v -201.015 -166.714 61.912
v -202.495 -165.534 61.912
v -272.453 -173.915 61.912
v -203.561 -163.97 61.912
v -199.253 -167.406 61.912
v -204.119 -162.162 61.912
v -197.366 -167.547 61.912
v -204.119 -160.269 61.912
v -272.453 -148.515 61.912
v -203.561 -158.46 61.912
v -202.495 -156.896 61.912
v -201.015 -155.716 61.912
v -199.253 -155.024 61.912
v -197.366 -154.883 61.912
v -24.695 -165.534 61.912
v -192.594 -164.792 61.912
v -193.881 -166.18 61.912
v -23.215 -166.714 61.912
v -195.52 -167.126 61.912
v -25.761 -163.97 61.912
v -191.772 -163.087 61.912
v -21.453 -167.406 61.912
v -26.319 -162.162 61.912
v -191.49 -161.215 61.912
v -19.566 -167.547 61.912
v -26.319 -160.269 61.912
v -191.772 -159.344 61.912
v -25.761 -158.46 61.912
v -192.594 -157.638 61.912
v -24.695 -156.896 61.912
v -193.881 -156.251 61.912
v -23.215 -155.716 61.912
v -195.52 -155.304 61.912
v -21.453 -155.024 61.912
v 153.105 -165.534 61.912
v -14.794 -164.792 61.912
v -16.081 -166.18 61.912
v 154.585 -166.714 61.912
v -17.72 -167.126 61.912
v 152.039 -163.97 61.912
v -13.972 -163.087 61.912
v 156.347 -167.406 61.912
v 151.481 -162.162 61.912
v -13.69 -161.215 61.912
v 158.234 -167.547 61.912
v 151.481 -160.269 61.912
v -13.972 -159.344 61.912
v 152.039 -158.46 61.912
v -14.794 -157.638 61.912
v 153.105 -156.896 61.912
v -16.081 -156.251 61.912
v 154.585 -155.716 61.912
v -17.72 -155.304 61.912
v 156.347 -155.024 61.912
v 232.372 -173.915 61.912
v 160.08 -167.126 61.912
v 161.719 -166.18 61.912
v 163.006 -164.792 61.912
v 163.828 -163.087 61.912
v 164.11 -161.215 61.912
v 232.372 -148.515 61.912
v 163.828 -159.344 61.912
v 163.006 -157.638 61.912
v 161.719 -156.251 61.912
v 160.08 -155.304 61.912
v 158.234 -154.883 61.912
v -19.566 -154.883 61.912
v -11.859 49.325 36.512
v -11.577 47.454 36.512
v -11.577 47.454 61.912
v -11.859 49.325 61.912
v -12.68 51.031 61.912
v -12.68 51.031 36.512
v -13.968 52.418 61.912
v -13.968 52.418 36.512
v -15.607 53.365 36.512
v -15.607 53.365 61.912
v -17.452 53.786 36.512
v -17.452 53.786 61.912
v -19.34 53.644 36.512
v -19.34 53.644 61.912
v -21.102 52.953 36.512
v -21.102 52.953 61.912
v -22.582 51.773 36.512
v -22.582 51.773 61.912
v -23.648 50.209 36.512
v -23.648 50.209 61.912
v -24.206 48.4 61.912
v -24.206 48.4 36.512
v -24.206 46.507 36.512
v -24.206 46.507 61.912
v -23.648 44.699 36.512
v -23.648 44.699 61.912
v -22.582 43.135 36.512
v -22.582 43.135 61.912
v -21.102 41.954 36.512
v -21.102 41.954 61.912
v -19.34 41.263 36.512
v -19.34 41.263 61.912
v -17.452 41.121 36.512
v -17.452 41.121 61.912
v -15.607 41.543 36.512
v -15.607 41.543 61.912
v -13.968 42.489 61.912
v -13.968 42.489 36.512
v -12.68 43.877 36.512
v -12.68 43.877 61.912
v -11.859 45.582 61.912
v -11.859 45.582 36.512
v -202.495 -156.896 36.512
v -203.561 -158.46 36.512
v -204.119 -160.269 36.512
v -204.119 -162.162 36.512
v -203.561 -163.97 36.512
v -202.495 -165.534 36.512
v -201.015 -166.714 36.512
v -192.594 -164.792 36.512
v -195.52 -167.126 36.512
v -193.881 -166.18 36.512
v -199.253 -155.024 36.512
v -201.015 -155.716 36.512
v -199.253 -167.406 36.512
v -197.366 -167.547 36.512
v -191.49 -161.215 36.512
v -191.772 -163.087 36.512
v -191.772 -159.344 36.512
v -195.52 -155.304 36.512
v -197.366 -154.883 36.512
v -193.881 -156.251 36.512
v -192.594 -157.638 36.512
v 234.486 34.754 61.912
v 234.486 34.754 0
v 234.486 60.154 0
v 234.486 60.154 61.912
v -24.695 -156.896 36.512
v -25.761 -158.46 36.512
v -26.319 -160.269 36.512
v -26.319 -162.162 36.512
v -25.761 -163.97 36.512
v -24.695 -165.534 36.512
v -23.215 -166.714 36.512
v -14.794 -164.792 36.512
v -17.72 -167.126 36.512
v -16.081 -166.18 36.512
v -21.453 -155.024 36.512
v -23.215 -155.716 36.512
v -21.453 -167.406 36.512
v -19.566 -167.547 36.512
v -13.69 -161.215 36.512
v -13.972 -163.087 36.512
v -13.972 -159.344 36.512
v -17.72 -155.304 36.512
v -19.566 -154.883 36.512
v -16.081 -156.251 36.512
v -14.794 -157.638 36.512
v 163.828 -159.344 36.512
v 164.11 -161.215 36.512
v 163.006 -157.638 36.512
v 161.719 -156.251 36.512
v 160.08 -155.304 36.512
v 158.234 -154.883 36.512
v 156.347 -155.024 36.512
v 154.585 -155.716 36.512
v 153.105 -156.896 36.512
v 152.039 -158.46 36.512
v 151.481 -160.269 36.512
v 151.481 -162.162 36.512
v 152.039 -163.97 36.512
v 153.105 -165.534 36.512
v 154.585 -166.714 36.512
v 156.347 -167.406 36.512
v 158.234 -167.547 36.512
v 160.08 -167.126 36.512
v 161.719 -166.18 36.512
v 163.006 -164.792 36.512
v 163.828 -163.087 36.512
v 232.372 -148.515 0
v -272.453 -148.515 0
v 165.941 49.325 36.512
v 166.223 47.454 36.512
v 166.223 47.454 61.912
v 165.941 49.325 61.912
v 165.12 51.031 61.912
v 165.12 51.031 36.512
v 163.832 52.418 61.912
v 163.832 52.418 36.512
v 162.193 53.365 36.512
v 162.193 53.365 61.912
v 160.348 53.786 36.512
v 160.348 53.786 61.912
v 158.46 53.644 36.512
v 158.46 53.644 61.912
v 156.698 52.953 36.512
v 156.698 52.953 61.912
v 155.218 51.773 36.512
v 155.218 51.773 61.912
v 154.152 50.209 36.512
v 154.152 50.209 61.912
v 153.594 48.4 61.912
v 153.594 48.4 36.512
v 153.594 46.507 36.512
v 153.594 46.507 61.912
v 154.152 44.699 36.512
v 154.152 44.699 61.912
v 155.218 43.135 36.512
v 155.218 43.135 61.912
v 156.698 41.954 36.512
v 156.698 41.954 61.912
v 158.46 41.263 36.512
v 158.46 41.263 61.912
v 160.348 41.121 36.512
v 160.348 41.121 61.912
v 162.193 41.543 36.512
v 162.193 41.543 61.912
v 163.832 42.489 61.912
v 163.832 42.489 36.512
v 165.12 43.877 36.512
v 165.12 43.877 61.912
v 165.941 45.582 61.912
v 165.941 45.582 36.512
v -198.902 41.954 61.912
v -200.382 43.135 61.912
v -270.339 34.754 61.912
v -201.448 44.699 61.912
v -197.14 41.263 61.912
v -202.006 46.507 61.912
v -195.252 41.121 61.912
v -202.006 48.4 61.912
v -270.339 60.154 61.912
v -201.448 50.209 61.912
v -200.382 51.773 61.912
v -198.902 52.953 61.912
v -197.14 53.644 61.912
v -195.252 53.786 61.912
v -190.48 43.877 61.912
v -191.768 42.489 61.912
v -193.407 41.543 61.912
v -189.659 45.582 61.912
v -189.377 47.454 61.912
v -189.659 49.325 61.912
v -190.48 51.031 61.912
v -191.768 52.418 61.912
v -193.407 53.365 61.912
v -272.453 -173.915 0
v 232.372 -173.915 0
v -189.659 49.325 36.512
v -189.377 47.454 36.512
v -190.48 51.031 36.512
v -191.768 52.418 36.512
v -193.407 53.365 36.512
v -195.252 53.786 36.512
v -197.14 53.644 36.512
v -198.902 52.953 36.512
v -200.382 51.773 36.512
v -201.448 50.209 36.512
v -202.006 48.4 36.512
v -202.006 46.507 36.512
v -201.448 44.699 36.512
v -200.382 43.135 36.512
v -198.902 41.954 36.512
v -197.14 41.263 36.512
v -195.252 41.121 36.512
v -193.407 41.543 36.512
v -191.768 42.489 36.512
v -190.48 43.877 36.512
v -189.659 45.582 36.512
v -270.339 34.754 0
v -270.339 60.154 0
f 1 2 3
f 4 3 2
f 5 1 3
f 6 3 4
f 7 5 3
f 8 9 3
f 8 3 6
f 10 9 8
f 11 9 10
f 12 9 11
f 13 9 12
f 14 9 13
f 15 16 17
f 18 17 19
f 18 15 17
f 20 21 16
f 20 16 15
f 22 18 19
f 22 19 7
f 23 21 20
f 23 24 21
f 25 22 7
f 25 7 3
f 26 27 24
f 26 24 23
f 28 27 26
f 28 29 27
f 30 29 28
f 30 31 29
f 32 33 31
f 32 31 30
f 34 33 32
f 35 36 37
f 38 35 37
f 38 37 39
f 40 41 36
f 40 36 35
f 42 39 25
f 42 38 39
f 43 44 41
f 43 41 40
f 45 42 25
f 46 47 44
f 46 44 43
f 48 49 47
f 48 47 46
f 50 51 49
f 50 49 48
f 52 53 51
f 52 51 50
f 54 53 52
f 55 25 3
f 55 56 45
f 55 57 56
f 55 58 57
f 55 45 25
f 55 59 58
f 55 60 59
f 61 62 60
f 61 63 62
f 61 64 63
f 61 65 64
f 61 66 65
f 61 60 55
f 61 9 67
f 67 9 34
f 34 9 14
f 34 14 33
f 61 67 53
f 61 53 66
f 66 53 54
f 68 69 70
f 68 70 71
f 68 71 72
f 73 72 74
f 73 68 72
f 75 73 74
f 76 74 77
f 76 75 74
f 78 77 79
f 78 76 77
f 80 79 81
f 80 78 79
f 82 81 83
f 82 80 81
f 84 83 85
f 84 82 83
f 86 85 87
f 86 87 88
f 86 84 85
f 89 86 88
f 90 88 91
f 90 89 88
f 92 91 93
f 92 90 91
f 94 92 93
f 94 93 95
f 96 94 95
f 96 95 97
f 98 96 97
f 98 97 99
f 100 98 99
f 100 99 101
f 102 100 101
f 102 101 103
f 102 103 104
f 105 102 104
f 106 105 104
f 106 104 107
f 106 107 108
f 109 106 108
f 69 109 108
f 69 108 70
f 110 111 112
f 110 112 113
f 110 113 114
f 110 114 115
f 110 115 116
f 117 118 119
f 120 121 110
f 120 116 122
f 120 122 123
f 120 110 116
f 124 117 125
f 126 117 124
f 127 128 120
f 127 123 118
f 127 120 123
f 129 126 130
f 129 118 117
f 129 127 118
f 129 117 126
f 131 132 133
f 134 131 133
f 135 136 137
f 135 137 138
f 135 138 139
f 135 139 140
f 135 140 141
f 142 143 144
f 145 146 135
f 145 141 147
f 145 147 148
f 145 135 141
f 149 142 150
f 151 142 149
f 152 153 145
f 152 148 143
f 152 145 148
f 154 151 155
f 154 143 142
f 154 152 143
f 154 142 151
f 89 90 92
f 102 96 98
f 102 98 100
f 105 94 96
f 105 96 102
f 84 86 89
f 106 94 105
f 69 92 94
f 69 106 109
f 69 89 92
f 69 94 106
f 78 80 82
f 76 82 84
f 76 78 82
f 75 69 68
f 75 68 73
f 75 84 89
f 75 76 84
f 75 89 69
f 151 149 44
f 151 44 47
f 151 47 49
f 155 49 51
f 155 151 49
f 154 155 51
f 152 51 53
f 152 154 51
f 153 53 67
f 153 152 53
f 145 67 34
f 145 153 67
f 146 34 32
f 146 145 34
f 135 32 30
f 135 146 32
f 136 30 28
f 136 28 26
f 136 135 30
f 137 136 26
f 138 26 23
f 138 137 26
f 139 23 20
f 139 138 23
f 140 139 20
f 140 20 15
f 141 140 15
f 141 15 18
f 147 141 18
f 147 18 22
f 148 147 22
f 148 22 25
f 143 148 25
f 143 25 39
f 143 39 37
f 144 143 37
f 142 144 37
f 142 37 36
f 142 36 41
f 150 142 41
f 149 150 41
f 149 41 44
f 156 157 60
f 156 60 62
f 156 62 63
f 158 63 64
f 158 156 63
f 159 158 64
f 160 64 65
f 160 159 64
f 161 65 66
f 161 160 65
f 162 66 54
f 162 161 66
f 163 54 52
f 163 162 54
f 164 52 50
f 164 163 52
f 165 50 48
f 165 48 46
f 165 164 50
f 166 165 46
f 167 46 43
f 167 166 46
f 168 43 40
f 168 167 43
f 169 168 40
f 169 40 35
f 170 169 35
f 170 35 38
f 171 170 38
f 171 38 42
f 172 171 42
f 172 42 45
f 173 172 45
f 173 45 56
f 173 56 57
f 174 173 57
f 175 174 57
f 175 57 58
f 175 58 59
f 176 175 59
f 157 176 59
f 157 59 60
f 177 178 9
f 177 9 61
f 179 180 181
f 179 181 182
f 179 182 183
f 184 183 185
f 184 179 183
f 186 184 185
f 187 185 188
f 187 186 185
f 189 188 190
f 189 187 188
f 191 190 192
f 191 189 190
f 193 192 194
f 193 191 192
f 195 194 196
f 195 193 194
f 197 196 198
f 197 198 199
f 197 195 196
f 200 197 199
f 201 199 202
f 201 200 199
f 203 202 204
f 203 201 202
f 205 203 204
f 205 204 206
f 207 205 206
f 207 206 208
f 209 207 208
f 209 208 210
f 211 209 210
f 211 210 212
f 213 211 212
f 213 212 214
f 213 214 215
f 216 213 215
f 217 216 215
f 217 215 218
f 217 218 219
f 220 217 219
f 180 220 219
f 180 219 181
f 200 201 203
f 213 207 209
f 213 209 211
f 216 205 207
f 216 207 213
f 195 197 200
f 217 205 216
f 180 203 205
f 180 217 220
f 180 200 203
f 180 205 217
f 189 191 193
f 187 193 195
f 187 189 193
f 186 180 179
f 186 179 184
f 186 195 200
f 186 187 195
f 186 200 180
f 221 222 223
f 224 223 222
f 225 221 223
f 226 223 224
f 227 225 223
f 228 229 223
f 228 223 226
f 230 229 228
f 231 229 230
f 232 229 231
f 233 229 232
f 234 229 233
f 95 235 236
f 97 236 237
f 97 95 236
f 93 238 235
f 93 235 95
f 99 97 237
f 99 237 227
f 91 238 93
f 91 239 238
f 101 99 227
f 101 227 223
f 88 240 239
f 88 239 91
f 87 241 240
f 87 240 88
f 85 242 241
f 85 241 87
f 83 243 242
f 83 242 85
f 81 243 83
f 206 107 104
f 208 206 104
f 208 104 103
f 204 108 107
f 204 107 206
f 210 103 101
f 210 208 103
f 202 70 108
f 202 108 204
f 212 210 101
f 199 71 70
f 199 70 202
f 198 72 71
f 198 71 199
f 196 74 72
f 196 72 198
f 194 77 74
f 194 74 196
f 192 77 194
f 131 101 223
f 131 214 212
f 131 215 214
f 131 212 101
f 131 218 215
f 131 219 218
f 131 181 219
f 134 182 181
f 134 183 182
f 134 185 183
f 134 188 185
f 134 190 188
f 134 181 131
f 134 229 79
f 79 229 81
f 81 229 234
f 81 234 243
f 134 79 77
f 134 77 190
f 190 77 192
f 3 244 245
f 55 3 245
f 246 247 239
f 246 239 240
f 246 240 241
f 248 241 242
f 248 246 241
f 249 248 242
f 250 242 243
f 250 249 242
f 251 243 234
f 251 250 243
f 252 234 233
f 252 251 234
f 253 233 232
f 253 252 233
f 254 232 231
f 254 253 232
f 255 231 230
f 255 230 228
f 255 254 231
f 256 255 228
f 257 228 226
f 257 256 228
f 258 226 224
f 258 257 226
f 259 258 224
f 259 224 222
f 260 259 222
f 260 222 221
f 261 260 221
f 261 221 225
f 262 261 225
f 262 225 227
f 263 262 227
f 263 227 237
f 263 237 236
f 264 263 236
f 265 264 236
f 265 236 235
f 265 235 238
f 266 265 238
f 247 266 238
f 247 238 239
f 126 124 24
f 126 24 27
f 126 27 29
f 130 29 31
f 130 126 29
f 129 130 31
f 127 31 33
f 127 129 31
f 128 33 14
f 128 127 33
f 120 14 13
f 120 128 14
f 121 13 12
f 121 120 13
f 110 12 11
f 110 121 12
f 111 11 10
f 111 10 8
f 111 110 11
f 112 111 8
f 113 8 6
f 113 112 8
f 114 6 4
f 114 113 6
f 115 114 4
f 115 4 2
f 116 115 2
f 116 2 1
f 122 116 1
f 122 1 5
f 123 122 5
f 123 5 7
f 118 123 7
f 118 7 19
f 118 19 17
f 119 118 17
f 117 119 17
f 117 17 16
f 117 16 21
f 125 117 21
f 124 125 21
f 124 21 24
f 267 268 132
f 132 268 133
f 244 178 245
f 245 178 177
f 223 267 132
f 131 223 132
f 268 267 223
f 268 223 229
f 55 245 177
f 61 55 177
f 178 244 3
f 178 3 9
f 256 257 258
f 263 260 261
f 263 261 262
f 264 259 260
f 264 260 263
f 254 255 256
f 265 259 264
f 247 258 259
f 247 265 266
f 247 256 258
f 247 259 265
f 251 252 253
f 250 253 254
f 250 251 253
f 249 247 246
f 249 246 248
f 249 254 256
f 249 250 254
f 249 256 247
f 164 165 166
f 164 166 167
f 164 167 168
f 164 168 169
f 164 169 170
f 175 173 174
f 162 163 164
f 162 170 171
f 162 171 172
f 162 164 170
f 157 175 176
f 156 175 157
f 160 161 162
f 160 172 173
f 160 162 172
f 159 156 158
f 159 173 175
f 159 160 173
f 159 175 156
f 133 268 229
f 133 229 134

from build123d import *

# Parameters (mm, degrees)
F0_W     = 504.825
F0_H     = 25.4
F0_R     = 6.35
F1_DEPTH = 61.9125
F2_DEPTH = 36.5125


with BuildPart() as f1:
    # F0 (on Top) → F1 (new body)
    with BuildSketch(Plane.XY):
        with Locations((-17.9268002128, 47.4536679604)):
            Rectangle(F0_W, F0_H)
        with Locations((-195.7268002128, 47.4536679604)):
            Circle(F0_R, mode=Mode.SUBTRACT)
        with Locations((-17.9268002128, 47.4536679604)):
            Circle(F0_R, mode=Mode.SUBTRACT)
        with Locations((159.8731997872, 47.4536679604)):
            Circle(F0_R, mode=Mode.SUBTRACT)
    extrude(amount=F1_DEPTH)

    # F0 (on Top) → F2 (join)
    with BuildSketch(Plane.XY):
        with Locations((-195.7268002128, 47.4536679604)):
            Circle(F0_R)
        with Locations((-17.9268002128, 47.4536679604)):
            Circle(F0_R)
        with Locations((159.8731997872, 47.4536679604)):
            Circle(F0_R)
    extrude(amount=F2_DEPTH)


with BuildPart() as f1b:
    # F0 (on Top) → F1, piece 2 (new body)
    with BuildSketch(Plane.XY):
        with Locations((-20.0401226521, -161.215207386)):
            Rectangle(F0_W, F0_H)
        with Locations((-197.8401226521, -161.215207386)):
            Circle(F0_R, mode=Mode.SUBTRACT)
        with Locations((-20.0401226521, -161.215207386)):
            Circle(F0_R, mode=Mode.SUBTRACT)
        with Locations((157.7598773479, -161.215207386)):
            Circle(F0_R, mode=Mode.SUBTRACT)
    extrude(amount=F1_DEPTH)

    # F0 (on Top) → F2, piece 2 (join)
    with BuildSketch(Plane.XY):
        with Locations((-197.8401226521, -161.215207386)):
            Circle(F0_R)
        with Locations((-20.0401226521, -161.215207386)):
            Circle(F0_R)
        with Locations((157.7598773479, -161.215207386)):
            Circle(F0_R)
    extrude(amount=F2_DEPTH)


solid = Compound([f1.part, f1b.part])
